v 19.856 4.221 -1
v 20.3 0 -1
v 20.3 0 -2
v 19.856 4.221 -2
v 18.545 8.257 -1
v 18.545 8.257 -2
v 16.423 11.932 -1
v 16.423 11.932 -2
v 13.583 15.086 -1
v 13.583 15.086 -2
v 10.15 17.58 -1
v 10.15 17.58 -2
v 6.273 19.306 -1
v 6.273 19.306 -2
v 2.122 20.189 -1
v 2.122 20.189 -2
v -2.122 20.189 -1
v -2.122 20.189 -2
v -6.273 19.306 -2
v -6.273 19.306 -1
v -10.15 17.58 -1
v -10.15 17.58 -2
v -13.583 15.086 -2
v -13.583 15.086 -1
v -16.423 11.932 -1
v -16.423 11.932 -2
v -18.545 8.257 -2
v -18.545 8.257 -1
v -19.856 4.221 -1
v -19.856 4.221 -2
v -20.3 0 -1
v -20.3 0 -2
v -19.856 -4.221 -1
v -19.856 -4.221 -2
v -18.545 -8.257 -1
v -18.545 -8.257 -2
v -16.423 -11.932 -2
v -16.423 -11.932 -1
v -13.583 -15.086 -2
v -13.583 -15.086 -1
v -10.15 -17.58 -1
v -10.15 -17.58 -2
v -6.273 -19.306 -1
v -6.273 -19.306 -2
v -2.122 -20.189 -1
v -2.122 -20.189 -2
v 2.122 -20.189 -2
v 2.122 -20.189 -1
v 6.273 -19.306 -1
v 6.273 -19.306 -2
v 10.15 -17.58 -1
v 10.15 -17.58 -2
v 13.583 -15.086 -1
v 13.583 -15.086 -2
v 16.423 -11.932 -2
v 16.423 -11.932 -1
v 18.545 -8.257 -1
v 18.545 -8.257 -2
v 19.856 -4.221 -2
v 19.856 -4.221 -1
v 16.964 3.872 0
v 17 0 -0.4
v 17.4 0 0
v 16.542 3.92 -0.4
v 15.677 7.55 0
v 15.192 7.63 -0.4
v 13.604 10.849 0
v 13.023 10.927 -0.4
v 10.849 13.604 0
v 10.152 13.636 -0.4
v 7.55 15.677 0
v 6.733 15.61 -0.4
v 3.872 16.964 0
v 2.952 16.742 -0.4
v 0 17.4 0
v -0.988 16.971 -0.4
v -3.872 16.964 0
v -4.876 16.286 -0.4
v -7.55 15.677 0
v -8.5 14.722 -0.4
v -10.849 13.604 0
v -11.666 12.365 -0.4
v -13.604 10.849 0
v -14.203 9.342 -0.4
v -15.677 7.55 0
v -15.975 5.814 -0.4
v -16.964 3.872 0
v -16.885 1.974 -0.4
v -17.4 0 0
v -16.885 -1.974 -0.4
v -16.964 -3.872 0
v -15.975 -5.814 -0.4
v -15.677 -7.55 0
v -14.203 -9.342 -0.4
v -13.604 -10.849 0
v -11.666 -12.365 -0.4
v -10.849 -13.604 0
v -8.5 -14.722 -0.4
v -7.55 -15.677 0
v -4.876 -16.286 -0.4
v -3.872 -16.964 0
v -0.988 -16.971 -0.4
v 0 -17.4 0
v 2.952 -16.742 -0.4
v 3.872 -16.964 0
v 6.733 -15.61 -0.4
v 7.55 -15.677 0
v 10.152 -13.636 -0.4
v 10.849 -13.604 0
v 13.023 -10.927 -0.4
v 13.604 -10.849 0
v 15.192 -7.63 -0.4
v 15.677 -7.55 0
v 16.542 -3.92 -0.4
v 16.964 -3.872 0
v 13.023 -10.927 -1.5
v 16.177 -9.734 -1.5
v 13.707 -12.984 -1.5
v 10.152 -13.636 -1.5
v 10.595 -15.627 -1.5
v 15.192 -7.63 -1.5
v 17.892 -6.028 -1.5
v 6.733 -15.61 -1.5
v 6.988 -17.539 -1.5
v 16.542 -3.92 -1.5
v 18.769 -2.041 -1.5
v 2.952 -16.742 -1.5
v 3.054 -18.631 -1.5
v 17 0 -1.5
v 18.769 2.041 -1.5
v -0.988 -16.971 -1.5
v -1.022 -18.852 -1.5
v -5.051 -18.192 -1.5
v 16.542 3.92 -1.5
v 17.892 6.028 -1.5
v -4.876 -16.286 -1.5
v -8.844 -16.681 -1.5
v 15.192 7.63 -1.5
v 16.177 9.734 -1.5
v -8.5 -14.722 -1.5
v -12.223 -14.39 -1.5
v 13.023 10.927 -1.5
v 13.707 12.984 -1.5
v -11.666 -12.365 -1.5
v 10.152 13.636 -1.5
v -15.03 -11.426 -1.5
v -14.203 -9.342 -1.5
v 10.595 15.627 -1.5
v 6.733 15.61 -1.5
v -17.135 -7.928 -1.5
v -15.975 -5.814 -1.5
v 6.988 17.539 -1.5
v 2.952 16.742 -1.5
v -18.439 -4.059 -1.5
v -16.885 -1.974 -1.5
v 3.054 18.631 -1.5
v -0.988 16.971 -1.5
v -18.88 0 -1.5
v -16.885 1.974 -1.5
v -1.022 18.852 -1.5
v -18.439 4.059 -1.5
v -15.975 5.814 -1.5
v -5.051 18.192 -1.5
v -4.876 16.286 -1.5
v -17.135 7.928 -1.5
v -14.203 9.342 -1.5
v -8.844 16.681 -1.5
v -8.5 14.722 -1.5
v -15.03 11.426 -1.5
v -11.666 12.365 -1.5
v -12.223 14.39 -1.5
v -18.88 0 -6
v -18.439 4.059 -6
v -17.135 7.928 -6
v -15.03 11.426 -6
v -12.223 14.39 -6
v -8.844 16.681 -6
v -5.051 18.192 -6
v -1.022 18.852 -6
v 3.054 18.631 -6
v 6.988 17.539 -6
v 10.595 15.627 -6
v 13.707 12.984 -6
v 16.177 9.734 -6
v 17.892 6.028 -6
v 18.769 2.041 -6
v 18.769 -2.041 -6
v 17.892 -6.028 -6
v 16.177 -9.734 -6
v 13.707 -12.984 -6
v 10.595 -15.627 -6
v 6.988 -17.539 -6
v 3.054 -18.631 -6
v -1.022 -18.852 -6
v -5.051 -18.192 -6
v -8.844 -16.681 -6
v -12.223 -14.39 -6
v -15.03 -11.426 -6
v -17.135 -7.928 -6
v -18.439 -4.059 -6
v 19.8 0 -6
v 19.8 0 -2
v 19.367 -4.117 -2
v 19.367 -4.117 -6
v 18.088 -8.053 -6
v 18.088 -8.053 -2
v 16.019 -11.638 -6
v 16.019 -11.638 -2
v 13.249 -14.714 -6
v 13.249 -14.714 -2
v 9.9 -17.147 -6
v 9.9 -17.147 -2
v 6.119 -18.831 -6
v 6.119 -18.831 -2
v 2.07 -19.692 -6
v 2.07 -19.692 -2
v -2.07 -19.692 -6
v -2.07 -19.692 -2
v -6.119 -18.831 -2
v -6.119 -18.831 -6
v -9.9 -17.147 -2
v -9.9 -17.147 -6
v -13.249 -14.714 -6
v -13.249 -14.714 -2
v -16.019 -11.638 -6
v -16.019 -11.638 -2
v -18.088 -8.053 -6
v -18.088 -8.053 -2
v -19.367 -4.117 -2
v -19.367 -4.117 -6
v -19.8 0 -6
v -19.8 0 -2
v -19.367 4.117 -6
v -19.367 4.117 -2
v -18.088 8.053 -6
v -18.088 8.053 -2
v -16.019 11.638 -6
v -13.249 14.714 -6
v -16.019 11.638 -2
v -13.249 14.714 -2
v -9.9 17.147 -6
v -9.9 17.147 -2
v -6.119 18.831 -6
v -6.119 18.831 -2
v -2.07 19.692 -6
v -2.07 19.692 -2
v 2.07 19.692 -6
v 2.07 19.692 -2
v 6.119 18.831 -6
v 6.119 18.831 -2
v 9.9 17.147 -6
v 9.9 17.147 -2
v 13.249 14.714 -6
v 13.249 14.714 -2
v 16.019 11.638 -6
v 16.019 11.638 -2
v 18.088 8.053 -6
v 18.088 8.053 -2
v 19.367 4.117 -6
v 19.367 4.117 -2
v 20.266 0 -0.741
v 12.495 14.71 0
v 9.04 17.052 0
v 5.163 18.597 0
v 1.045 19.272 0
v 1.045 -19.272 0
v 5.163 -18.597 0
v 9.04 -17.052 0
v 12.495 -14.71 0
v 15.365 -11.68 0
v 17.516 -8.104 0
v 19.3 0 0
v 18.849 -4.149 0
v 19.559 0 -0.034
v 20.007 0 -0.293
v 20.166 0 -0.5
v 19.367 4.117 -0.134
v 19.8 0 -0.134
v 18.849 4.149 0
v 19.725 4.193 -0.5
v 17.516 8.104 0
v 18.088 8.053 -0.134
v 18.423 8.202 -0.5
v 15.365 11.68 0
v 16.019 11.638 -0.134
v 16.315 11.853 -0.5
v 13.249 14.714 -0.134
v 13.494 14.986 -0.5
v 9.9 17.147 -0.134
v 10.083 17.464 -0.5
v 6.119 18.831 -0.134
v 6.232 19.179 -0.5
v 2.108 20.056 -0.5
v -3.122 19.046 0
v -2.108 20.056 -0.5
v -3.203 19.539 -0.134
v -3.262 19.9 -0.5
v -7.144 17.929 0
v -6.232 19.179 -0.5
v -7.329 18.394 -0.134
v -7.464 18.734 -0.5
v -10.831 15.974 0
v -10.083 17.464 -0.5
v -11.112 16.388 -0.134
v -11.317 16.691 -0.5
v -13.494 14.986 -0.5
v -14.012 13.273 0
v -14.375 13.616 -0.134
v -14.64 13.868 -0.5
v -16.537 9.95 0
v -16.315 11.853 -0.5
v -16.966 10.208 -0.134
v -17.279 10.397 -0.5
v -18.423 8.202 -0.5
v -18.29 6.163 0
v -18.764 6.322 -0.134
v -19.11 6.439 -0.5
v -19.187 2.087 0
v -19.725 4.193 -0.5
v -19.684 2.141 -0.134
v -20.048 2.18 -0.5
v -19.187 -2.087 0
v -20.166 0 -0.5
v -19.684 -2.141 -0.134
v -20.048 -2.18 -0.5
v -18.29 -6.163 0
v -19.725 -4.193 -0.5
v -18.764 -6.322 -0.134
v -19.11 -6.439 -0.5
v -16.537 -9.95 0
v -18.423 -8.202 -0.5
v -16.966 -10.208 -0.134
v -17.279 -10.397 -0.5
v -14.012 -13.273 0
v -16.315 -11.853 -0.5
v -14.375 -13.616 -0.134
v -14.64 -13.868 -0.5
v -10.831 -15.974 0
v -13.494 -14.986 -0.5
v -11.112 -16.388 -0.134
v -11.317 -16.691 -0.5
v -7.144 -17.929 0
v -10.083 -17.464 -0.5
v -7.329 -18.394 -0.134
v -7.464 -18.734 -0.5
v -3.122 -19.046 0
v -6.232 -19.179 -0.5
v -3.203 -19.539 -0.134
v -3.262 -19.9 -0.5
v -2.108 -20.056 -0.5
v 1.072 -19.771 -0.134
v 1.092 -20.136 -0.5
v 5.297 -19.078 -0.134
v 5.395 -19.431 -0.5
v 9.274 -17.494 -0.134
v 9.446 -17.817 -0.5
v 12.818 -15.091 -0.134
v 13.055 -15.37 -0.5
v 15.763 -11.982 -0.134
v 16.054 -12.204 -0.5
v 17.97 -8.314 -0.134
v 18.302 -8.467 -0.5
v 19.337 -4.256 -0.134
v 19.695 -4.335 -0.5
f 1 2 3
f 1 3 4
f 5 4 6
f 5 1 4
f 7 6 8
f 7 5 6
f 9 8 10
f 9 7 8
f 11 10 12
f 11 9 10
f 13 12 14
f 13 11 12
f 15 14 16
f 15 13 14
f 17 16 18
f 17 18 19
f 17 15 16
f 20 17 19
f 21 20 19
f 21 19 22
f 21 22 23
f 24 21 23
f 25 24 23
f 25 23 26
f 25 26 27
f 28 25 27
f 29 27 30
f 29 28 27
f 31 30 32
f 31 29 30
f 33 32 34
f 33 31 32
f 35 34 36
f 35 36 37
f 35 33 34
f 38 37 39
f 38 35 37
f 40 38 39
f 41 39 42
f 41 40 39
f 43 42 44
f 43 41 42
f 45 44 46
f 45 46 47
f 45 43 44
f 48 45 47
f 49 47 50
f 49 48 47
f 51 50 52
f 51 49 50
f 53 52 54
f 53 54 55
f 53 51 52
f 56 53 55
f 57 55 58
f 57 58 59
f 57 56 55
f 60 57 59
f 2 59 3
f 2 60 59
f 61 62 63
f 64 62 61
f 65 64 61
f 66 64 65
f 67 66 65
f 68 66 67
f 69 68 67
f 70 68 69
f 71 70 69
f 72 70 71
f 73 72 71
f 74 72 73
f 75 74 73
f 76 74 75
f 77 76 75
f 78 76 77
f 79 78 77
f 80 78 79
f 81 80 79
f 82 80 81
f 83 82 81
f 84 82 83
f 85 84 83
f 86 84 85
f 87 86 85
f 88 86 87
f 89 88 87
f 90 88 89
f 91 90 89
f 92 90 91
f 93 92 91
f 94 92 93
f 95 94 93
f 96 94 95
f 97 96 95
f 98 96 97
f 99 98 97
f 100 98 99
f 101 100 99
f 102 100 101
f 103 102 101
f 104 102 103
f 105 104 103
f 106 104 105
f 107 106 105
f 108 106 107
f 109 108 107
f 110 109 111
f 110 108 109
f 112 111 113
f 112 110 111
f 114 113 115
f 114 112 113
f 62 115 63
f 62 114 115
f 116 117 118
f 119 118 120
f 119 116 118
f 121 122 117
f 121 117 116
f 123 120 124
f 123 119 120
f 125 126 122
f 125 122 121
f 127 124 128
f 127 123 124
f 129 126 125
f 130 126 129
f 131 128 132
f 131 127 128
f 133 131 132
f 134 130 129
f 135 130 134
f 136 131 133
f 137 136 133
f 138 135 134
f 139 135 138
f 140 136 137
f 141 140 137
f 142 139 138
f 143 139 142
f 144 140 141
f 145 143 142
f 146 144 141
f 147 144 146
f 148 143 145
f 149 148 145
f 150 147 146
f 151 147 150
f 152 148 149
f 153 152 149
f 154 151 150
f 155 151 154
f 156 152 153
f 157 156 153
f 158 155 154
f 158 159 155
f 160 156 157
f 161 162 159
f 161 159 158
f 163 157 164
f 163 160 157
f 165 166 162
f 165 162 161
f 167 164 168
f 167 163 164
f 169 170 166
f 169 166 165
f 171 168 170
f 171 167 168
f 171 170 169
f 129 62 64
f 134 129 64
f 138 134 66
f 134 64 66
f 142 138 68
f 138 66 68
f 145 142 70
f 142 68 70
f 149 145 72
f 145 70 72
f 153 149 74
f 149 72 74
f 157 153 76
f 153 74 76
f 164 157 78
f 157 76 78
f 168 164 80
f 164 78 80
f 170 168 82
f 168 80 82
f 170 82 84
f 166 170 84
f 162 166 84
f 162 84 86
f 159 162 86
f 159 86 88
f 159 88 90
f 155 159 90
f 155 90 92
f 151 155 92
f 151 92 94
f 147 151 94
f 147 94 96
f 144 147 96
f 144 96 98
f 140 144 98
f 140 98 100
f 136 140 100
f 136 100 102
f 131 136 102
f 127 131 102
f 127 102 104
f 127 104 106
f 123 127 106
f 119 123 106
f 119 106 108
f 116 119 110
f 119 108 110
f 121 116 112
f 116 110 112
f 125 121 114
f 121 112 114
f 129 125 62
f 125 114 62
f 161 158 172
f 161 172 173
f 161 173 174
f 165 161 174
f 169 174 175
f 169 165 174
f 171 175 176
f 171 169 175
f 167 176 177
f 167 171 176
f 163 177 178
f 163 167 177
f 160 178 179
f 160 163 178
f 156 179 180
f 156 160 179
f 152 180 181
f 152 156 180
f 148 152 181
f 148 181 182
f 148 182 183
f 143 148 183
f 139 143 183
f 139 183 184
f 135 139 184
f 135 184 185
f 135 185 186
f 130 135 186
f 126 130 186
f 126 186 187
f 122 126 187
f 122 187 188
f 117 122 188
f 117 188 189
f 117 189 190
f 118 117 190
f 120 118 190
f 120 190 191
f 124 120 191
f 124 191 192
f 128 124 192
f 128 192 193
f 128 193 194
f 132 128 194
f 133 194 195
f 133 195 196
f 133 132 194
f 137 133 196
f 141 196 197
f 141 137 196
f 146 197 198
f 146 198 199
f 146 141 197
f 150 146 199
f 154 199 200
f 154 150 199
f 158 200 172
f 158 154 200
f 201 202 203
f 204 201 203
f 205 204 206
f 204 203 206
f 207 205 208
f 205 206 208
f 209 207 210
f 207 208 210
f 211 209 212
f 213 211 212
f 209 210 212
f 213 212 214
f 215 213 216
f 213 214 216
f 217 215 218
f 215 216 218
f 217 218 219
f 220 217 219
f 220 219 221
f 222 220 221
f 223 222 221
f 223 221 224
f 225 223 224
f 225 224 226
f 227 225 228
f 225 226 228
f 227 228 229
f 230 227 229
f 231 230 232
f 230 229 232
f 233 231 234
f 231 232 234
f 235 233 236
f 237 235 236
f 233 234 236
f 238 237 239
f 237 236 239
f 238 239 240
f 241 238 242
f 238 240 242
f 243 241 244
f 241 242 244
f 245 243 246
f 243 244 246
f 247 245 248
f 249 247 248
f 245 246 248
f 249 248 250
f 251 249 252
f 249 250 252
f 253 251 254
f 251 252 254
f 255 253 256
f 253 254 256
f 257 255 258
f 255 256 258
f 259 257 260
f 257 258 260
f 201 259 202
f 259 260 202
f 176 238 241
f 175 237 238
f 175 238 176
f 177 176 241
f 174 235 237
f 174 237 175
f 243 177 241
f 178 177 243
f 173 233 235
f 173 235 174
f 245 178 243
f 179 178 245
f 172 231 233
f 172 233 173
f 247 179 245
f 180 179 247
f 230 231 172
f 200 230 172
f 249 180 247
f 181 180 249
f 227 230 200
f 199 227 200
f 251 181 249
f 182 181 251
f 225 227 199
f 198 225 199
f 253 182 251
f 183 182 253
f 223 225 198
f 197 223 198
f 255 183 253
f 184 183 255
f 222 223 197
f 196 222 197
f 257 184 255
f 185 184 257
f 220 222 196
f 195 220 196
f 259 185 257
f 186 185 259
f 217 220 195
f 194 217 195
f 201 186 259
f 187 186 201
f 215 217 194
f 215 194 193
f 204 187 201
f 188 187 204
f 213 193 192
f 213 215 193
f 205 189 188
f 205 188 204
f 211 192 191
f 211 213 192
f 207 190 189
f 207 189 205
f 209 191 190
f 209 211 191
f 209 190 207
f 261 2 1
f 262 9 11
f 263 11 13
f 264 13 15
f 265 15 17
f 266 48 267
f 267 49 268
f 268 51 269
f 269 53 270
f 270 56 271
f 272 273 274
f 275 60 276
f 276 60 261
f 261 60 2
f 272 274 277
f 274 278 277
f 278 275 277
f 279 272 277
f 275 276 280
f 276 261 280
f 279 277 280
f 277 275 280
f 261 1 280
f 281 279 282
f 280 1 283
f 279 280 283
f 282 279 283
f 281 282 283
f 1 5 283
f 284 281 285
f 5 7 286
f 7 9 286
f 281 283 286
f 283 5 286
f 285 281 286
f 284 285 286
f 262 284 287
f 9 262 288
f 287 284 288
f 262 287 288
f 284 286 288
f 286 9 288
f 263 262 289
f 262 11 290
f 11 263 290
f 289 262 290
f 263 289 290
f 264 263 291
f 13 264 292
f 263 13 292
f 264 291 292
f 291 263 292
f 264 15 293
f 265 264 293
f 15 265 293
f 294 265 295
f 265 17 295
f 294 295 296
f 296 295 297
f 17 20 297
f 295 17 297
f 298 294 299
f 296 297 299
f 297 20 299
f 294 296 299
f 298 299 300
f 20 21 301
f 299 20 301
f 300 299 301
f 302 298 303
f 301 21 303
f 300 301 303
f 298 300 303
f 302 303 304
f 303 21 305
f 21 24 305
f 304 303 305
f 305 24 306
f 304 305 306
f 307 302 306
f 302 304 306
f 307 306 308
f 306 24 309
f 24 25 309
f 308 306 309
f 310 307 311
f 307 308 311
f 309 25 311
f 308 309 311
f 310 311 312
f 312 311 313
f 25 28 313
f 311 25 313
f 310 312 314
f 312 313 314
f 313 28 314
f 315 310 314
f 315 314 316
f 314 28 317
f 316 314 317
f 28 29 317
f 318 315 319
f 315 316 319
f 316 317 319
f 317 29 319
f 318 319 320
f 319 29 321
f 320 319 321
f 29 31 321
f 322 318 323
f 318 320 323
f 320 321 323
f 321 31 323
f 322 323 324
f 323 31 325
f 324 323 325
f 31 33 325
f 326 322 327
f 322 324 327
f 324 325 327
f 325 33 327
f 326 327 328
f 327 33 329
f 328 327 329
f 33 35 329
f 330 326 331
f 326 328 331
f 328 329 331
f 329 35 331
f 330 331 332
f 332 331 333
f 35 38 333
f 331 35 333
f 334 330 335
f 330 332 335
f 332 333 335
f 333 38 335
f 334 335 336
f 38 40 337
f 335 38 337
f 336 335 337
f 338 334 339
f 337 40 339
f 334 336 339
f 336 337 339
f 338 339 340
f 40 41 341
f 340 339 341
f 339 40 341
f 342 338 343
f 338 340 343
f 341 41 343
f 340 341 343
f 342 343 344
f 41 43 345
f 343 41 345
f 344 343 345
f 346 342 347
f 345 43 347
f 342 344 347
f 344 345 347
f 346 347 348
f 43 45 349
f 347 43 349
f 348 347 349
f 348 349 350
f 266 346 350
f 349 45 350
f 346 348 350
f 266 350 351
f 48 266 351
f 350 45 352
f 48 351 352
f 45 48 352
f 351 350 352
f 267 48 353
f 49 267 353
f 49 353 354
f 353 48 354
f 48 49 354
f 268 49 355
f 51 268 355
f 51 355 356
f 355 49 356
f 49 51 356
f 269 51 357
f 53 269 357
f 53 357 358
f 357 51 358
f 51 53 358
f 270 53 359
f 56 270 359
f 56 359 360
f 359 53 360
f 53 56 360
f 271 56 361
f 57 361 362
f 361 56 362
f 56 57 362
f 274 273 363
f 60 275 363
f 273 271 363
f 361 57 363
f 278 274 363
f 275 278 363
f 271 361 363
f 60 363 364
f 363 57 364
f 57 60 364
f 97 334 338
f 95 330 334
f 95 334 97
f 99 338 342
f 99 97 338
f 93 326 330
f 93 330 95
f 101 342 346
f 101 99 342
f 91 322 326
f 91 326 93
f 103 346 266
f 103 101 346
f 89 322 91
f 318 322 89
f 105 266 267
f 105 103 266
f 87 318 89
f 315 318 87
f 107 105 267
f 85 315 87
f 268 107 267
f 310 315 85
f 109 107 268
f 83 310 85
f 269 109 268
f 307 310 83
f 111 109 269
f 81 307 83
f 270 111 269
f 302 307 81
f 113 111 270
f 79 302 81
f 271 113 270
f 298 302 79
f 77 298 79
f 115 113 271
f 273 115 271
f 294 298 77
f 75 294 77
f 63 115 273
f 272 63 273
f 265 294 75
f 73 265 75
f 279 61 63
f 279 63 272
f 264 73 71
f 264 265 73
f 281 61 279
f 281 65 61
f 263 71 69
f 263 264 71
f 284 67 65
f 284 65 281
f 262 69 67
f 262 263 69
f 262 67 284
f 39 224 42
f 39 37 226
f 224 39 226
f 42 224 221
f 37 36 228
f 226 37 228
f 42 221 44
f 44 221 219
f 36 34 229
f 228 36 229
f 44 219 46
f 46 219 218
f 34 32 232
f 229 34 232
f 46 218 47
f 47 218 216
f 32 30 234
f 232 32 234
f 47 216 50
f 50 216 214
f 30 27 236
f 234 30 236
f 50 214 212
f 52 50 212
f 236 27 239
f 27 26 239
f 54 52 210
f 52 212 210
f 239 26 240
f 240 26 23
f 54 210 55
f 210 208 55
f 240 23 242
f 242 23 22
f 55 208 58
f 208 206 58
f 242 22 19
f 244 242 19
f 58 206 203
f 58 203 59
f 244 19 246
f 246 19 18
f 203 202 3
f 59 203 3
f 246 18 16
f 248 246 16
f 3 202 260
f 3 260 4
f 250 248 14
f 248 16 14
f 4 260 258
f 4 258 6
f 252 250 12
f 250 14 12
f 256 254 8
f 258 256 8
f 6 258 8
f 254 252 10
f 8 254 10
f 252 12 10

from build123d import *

# Parameters (mm, degrees)
SKETCH1_R           = 20.3
SKETCH1_R_2         = 17
BOSS_EXTRUDE1_DEPTH = 2
SKETCH2_R           = 19.8
SKETCH2_R_2         = 18.88
BOSS_EXTRUDE2_DEPTH = 4
CHAMFER2_SIZE       = 0.4
CUT_EXTRUDE1_START  = -0.5
SKETCH3_R           = 18.88
CUT_EXTRUDE1_DEPTH  = 0.5
FILLET1_R           = 1


with BuildPart() as part:
    # Sketch1 → Boss-Extrude1 (new body)
    with BuildSketch(Plane.XY):
        Circle(SKETCH1_R)
        Circle(SKETCH1_R_2, mode=Mode.SUBTRACT)
    extrude(amount=-BOSS_EXTRUDE1_DEPTH)

    # Sketch2 → Boss-Extrude2 (add)
    with BuildSketch(Plane(origin=(0, 0, -2), x_dir=(-1, 0, 0), z_dir=(0, 0, -1))):
        with Locations(Location((0, 0, 0), (0, 0, 180))):
            Circle(SKETCH2_R)
        Circle(SKETCH2_R_2, mode=Mode.SUBTRACT)
    extrude(amount=BOSS_EXTRUDE2_DEPTH)

    # Chamfer2
    chamfer2_edges = [part.edges().sort_by_distance(p)[0] for p in [
        (-17, 0, 0),
    ]]
    chamfer(chamfer2_edges, length=CHAMFER2_SIZE)

    # Sketch3 → Cut-Extrude1 (cut)
    with BuildSketch(Plane(origin=(0, 0, -2), x_dir=(-1, 0, 0), z_dir=(0, 0, -1)).offset(CUT_EXTRUDE1_START)):
        Circle(SKETCH3_R)
    extrude(amount=CUT_EXTRUDE1_DEPTH, mode=Mode.SUBTRACT)

    # Fillet1
    fillet1_edges = [part.edges().sort_by_distance(p)[0] for p in [
        (-20.3, 0, 0),
    ]]
    fillet(fillet1_edges, radius=FILLET1_R)


solid = part.part
